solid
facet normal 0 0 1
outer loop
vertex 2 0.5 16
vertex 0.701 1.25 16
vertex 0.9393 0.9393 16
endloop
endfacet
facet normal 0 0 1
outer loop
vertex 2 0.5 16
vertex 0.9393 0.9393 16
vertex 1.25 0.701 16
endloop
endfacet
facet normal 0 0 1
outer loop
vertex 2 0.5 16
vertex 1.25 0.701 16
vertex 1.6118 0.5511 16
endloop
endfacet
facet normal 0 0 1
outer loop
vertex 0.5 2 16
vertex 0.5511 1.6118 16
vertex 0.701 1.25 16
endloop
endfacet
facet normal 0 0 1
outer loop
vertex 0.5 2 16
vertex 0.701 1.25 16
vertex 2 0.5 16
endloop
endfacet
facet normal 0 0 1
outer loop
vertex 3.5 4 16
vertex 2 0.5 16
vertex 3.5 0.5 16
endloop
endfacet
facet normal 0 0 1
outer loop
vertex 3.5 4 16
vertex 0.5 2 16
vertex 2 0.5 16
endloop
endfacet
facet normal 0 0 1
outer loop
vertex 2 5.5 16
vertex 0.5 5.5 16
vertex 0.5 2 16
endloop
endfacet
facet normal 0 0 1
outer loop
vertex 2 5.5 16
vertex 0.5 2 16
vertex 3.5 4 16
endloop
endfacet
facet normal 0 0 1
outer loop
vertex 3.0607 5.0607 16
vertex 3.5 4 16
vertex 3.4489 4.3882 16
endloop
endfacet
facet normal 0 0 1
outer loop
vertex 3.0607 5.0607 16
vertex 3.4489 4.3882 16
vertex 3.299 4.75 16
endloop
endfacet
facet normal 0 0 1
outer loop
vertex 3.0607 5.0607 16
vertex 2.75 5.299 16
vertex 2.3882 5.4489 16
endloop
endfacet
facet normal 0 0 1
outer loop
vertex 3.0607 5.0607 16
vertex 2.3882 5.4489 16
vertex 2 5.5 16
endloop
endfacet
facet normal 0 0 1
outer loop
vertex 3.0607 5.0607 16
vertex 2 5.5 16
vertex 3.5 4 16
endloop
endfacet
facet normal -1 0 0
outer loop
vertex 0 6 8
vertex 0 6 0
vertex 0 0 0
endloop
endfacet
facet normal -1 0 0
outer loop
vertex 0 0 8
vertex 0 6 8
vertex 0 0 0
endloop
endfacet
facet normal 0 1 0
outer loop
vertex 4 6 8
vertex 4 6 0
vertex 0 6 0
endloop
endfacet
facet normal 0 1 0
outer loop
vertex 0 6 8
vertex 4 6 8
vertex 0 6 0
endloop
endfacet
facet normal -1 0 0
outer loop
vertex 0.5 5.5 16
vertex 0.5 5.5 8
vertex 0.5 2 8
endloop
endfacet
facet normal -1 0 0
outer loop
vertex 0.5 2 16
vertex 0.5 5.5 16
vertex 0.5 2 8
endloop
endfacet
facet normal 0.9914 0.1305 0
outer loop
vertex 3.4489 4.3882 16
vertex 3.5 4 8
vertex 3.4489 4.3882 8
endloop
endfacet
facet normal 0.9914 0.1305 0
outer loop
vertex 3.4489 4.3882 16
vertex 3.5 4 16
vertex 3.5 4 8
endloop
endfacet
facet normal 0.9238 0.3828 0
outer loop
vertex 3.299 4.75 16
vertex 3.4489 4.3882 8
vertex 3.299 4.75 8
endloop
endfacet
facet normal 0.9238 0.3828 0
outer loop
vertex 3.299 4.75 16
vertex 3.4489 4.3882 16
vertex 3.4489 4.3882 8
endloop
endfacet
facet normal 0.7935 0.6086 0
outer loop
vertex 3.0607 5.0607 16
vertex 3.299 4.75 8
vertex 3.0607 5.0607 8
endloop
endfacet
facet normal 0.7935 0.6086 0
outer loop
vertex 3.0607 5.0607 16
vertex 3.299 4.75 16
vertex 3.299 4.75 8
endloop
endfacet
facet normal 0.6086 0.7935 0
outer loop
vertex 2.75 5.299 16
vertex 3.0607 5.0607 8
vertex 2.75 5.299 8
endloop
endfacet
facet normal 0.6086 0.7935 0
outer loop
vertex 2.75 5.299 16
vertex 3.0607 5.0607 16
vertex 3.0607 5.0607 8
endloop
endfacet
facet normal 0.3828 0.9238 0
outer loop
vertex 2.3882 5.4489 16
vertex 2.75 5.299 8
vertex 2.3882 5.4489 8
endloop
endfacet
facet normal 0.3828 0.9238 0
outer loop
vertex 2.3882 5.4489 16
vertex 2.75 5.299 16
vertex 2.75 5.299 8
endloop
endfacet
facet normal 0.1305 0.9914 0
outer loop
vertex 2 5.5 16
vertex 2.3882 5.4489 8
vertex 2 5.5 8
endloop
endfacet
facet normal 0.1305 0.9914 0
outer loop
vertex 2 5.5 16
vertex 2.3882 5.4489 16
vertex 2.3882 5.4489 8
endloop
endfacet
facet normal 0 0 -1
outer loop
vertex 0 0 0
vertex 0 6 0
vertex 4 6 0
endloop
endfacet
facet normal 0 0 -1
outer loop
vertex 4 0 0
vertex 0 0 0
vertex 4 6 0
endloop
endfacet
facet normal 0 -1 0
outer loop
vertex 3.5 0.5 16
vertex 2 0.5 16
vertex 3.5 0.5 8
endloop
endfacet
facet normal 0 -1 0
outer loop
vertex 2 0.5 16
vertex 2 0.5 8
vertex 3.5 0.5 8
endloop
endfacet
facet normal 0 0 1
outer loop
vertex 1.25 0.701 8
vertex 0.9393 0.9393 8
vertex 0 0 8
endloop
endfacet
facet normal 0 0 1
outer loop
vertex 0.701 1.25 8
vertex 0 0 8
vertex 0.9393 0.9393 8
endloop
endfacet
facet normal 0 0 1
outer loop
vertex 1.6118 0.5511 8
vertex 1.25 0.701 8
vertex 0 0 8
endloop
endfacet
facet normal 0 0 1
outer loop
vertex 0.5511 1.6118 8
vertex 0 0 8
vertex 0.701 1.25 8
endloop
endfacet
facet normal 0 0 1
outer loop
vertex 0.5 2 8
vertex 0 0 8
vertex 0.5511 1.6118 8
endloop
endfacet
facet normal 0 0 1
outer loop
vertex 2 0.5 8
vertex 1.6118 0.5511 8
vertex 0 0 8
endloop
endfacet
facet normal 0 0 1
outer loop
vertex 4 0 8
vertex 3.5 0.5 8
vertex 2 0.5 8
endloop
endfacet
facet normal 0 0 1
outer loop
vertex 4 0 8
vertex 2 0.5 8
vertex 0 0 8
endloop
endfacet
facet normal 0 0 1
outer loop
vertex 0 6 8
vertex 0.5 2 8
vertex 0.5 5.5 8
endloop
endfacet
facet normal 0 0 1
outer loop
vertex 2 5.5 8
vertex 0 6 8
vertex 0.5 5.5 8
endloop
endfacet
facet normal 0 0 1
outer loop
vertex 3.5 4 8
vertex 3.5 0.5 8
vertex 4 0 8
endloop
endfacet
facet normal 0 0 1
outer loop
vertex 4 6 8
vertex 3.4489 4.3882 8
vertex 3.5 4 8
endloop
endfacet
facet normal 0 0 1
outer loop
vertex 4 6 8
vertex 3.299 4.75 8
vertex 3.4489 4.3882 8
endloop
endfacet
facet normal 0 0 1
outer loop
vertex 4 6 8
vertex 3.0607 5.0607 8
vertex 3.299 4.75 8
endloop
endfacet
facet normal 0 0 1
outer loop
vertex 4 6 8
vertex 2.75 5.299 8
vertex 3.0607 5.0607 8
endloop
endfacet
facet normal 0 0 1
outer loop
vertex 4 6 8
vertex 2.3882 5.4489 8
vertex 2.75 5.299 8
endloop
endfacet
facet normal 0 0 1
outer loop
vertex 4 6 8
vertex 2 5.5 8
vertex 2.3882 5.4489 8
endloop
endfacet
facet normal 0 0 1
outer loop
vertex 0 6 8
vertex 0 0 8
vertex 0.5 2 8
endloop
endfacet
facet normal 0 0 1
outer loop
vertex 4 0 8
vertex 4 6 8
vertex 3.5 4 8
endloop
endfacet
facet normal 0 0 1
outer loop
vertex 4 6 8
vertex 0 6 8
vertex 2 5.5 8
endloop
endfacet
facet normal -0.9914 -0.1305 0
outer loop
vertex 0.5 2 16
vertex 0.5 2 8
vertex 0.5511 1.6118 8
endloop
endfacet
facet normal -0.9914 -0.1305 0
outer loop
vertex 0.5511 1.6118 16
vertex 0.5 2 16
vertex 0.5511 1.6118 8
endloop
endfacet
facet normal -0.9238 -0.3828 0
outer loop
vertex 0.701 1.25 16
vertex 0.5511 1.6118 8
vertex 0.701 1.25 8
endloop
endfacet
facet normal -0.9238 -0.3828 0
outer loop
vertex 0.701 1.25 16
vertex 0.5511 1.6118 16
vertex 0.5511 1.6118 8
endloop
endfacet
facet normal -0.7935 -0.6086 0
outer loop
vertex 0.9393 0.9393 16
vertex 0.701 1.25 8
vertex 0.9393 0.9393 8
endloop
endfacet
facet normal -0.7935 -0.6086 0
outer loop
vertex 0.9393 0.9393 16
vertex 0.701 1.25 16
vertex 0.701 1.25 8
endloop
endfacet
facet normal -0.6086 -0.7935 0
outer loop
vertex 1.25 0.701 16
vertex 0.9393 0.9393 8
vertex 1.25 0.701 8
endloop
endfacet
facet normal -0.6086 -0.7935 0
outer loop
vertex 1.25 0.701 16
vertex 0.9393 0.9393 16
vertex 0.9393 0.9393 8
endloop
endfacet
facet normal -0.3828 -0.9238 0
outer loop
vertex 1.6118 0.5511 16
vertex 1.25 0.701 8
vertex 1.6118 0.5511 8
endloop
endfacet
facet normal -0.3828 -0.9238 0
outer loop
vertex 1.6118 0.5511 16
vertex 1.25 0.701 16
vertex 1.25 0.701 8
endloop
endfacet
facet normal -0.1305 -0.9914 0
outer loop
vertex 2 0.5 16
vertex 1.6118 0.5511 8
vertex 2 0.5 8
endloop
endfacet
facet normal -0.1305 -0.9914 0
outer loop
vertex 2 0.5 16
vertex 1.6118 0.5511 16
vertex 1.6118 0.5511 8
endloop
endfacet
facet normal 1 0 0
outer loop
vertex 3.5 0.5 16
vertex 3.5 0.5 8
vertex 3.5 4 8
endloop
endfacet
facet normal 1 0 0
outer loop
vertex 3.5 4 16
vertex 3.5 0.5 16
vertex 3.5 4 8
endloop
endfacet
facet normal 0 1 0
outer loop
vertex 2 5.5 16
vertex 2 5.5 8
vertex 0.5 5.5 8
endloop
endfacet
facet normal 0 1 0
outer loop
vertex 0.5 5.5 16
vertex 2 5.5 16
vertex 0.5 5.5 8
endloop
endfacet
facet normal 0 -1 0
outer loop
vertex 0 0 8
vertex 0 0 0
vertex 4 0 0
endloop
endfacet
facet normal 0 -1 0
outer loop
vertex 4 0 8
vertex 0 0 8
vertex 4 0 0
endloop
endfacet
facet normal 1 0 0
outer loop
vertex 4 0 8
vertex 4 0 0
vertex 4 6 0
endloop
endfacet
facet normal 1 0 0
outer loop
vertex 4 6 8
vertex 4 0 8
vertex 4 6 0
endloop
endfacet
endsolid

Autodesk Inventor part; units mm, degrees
ref_plane "YZ Plane" through (0, 0, 0) normal (1, 0, 0) x (0, 1, 0)
ref_plane "XZ Plane" through (0, 0, 0) normal (0, 1, 0) x (-1, 0, 0)
ref_plane "XY Plane" through (0, 0, 0) normal (0, 0, 1) x (1, 0, 0)
sketch "Sketch1" plane through (0, 0, 0) normal (0, 0, 1) x (1, 0, 0)
  line L0 (0, 0) -> (4, 0)
  line L1 (4, 0) -> (4, 6)
  line L2 (4, 6) -> (0, 6)
  line L3 (0, 6) -> (0, 0)
extrude "Extrusion1" add sketch "Sketch1" along normal blind 8
sketch "Sketch2" plane through (0, 0, 8) normal (0, 0, 1) x (1, 0, 0)
  line L0 (0.5, 0.5) -> (3.5, 0.5)
  line L1 (3.5, 0.5) -> (3.5, 5.5)
  line L2 (3.5, 5.5) -> (0.5, 5.5)
  line L3 (0.5, 5.5) -> (0.5, 0.5)
  point P0 (0, 0)
extrude "Extrusion2" add sketch "Sketch2" along normal blind 8
fillet "Fillet1" radius 1.5 2 edges at (3.5, 5.5, 12) (0.5, 0.5, 12)
properties part number "button_press_fitting_new"
